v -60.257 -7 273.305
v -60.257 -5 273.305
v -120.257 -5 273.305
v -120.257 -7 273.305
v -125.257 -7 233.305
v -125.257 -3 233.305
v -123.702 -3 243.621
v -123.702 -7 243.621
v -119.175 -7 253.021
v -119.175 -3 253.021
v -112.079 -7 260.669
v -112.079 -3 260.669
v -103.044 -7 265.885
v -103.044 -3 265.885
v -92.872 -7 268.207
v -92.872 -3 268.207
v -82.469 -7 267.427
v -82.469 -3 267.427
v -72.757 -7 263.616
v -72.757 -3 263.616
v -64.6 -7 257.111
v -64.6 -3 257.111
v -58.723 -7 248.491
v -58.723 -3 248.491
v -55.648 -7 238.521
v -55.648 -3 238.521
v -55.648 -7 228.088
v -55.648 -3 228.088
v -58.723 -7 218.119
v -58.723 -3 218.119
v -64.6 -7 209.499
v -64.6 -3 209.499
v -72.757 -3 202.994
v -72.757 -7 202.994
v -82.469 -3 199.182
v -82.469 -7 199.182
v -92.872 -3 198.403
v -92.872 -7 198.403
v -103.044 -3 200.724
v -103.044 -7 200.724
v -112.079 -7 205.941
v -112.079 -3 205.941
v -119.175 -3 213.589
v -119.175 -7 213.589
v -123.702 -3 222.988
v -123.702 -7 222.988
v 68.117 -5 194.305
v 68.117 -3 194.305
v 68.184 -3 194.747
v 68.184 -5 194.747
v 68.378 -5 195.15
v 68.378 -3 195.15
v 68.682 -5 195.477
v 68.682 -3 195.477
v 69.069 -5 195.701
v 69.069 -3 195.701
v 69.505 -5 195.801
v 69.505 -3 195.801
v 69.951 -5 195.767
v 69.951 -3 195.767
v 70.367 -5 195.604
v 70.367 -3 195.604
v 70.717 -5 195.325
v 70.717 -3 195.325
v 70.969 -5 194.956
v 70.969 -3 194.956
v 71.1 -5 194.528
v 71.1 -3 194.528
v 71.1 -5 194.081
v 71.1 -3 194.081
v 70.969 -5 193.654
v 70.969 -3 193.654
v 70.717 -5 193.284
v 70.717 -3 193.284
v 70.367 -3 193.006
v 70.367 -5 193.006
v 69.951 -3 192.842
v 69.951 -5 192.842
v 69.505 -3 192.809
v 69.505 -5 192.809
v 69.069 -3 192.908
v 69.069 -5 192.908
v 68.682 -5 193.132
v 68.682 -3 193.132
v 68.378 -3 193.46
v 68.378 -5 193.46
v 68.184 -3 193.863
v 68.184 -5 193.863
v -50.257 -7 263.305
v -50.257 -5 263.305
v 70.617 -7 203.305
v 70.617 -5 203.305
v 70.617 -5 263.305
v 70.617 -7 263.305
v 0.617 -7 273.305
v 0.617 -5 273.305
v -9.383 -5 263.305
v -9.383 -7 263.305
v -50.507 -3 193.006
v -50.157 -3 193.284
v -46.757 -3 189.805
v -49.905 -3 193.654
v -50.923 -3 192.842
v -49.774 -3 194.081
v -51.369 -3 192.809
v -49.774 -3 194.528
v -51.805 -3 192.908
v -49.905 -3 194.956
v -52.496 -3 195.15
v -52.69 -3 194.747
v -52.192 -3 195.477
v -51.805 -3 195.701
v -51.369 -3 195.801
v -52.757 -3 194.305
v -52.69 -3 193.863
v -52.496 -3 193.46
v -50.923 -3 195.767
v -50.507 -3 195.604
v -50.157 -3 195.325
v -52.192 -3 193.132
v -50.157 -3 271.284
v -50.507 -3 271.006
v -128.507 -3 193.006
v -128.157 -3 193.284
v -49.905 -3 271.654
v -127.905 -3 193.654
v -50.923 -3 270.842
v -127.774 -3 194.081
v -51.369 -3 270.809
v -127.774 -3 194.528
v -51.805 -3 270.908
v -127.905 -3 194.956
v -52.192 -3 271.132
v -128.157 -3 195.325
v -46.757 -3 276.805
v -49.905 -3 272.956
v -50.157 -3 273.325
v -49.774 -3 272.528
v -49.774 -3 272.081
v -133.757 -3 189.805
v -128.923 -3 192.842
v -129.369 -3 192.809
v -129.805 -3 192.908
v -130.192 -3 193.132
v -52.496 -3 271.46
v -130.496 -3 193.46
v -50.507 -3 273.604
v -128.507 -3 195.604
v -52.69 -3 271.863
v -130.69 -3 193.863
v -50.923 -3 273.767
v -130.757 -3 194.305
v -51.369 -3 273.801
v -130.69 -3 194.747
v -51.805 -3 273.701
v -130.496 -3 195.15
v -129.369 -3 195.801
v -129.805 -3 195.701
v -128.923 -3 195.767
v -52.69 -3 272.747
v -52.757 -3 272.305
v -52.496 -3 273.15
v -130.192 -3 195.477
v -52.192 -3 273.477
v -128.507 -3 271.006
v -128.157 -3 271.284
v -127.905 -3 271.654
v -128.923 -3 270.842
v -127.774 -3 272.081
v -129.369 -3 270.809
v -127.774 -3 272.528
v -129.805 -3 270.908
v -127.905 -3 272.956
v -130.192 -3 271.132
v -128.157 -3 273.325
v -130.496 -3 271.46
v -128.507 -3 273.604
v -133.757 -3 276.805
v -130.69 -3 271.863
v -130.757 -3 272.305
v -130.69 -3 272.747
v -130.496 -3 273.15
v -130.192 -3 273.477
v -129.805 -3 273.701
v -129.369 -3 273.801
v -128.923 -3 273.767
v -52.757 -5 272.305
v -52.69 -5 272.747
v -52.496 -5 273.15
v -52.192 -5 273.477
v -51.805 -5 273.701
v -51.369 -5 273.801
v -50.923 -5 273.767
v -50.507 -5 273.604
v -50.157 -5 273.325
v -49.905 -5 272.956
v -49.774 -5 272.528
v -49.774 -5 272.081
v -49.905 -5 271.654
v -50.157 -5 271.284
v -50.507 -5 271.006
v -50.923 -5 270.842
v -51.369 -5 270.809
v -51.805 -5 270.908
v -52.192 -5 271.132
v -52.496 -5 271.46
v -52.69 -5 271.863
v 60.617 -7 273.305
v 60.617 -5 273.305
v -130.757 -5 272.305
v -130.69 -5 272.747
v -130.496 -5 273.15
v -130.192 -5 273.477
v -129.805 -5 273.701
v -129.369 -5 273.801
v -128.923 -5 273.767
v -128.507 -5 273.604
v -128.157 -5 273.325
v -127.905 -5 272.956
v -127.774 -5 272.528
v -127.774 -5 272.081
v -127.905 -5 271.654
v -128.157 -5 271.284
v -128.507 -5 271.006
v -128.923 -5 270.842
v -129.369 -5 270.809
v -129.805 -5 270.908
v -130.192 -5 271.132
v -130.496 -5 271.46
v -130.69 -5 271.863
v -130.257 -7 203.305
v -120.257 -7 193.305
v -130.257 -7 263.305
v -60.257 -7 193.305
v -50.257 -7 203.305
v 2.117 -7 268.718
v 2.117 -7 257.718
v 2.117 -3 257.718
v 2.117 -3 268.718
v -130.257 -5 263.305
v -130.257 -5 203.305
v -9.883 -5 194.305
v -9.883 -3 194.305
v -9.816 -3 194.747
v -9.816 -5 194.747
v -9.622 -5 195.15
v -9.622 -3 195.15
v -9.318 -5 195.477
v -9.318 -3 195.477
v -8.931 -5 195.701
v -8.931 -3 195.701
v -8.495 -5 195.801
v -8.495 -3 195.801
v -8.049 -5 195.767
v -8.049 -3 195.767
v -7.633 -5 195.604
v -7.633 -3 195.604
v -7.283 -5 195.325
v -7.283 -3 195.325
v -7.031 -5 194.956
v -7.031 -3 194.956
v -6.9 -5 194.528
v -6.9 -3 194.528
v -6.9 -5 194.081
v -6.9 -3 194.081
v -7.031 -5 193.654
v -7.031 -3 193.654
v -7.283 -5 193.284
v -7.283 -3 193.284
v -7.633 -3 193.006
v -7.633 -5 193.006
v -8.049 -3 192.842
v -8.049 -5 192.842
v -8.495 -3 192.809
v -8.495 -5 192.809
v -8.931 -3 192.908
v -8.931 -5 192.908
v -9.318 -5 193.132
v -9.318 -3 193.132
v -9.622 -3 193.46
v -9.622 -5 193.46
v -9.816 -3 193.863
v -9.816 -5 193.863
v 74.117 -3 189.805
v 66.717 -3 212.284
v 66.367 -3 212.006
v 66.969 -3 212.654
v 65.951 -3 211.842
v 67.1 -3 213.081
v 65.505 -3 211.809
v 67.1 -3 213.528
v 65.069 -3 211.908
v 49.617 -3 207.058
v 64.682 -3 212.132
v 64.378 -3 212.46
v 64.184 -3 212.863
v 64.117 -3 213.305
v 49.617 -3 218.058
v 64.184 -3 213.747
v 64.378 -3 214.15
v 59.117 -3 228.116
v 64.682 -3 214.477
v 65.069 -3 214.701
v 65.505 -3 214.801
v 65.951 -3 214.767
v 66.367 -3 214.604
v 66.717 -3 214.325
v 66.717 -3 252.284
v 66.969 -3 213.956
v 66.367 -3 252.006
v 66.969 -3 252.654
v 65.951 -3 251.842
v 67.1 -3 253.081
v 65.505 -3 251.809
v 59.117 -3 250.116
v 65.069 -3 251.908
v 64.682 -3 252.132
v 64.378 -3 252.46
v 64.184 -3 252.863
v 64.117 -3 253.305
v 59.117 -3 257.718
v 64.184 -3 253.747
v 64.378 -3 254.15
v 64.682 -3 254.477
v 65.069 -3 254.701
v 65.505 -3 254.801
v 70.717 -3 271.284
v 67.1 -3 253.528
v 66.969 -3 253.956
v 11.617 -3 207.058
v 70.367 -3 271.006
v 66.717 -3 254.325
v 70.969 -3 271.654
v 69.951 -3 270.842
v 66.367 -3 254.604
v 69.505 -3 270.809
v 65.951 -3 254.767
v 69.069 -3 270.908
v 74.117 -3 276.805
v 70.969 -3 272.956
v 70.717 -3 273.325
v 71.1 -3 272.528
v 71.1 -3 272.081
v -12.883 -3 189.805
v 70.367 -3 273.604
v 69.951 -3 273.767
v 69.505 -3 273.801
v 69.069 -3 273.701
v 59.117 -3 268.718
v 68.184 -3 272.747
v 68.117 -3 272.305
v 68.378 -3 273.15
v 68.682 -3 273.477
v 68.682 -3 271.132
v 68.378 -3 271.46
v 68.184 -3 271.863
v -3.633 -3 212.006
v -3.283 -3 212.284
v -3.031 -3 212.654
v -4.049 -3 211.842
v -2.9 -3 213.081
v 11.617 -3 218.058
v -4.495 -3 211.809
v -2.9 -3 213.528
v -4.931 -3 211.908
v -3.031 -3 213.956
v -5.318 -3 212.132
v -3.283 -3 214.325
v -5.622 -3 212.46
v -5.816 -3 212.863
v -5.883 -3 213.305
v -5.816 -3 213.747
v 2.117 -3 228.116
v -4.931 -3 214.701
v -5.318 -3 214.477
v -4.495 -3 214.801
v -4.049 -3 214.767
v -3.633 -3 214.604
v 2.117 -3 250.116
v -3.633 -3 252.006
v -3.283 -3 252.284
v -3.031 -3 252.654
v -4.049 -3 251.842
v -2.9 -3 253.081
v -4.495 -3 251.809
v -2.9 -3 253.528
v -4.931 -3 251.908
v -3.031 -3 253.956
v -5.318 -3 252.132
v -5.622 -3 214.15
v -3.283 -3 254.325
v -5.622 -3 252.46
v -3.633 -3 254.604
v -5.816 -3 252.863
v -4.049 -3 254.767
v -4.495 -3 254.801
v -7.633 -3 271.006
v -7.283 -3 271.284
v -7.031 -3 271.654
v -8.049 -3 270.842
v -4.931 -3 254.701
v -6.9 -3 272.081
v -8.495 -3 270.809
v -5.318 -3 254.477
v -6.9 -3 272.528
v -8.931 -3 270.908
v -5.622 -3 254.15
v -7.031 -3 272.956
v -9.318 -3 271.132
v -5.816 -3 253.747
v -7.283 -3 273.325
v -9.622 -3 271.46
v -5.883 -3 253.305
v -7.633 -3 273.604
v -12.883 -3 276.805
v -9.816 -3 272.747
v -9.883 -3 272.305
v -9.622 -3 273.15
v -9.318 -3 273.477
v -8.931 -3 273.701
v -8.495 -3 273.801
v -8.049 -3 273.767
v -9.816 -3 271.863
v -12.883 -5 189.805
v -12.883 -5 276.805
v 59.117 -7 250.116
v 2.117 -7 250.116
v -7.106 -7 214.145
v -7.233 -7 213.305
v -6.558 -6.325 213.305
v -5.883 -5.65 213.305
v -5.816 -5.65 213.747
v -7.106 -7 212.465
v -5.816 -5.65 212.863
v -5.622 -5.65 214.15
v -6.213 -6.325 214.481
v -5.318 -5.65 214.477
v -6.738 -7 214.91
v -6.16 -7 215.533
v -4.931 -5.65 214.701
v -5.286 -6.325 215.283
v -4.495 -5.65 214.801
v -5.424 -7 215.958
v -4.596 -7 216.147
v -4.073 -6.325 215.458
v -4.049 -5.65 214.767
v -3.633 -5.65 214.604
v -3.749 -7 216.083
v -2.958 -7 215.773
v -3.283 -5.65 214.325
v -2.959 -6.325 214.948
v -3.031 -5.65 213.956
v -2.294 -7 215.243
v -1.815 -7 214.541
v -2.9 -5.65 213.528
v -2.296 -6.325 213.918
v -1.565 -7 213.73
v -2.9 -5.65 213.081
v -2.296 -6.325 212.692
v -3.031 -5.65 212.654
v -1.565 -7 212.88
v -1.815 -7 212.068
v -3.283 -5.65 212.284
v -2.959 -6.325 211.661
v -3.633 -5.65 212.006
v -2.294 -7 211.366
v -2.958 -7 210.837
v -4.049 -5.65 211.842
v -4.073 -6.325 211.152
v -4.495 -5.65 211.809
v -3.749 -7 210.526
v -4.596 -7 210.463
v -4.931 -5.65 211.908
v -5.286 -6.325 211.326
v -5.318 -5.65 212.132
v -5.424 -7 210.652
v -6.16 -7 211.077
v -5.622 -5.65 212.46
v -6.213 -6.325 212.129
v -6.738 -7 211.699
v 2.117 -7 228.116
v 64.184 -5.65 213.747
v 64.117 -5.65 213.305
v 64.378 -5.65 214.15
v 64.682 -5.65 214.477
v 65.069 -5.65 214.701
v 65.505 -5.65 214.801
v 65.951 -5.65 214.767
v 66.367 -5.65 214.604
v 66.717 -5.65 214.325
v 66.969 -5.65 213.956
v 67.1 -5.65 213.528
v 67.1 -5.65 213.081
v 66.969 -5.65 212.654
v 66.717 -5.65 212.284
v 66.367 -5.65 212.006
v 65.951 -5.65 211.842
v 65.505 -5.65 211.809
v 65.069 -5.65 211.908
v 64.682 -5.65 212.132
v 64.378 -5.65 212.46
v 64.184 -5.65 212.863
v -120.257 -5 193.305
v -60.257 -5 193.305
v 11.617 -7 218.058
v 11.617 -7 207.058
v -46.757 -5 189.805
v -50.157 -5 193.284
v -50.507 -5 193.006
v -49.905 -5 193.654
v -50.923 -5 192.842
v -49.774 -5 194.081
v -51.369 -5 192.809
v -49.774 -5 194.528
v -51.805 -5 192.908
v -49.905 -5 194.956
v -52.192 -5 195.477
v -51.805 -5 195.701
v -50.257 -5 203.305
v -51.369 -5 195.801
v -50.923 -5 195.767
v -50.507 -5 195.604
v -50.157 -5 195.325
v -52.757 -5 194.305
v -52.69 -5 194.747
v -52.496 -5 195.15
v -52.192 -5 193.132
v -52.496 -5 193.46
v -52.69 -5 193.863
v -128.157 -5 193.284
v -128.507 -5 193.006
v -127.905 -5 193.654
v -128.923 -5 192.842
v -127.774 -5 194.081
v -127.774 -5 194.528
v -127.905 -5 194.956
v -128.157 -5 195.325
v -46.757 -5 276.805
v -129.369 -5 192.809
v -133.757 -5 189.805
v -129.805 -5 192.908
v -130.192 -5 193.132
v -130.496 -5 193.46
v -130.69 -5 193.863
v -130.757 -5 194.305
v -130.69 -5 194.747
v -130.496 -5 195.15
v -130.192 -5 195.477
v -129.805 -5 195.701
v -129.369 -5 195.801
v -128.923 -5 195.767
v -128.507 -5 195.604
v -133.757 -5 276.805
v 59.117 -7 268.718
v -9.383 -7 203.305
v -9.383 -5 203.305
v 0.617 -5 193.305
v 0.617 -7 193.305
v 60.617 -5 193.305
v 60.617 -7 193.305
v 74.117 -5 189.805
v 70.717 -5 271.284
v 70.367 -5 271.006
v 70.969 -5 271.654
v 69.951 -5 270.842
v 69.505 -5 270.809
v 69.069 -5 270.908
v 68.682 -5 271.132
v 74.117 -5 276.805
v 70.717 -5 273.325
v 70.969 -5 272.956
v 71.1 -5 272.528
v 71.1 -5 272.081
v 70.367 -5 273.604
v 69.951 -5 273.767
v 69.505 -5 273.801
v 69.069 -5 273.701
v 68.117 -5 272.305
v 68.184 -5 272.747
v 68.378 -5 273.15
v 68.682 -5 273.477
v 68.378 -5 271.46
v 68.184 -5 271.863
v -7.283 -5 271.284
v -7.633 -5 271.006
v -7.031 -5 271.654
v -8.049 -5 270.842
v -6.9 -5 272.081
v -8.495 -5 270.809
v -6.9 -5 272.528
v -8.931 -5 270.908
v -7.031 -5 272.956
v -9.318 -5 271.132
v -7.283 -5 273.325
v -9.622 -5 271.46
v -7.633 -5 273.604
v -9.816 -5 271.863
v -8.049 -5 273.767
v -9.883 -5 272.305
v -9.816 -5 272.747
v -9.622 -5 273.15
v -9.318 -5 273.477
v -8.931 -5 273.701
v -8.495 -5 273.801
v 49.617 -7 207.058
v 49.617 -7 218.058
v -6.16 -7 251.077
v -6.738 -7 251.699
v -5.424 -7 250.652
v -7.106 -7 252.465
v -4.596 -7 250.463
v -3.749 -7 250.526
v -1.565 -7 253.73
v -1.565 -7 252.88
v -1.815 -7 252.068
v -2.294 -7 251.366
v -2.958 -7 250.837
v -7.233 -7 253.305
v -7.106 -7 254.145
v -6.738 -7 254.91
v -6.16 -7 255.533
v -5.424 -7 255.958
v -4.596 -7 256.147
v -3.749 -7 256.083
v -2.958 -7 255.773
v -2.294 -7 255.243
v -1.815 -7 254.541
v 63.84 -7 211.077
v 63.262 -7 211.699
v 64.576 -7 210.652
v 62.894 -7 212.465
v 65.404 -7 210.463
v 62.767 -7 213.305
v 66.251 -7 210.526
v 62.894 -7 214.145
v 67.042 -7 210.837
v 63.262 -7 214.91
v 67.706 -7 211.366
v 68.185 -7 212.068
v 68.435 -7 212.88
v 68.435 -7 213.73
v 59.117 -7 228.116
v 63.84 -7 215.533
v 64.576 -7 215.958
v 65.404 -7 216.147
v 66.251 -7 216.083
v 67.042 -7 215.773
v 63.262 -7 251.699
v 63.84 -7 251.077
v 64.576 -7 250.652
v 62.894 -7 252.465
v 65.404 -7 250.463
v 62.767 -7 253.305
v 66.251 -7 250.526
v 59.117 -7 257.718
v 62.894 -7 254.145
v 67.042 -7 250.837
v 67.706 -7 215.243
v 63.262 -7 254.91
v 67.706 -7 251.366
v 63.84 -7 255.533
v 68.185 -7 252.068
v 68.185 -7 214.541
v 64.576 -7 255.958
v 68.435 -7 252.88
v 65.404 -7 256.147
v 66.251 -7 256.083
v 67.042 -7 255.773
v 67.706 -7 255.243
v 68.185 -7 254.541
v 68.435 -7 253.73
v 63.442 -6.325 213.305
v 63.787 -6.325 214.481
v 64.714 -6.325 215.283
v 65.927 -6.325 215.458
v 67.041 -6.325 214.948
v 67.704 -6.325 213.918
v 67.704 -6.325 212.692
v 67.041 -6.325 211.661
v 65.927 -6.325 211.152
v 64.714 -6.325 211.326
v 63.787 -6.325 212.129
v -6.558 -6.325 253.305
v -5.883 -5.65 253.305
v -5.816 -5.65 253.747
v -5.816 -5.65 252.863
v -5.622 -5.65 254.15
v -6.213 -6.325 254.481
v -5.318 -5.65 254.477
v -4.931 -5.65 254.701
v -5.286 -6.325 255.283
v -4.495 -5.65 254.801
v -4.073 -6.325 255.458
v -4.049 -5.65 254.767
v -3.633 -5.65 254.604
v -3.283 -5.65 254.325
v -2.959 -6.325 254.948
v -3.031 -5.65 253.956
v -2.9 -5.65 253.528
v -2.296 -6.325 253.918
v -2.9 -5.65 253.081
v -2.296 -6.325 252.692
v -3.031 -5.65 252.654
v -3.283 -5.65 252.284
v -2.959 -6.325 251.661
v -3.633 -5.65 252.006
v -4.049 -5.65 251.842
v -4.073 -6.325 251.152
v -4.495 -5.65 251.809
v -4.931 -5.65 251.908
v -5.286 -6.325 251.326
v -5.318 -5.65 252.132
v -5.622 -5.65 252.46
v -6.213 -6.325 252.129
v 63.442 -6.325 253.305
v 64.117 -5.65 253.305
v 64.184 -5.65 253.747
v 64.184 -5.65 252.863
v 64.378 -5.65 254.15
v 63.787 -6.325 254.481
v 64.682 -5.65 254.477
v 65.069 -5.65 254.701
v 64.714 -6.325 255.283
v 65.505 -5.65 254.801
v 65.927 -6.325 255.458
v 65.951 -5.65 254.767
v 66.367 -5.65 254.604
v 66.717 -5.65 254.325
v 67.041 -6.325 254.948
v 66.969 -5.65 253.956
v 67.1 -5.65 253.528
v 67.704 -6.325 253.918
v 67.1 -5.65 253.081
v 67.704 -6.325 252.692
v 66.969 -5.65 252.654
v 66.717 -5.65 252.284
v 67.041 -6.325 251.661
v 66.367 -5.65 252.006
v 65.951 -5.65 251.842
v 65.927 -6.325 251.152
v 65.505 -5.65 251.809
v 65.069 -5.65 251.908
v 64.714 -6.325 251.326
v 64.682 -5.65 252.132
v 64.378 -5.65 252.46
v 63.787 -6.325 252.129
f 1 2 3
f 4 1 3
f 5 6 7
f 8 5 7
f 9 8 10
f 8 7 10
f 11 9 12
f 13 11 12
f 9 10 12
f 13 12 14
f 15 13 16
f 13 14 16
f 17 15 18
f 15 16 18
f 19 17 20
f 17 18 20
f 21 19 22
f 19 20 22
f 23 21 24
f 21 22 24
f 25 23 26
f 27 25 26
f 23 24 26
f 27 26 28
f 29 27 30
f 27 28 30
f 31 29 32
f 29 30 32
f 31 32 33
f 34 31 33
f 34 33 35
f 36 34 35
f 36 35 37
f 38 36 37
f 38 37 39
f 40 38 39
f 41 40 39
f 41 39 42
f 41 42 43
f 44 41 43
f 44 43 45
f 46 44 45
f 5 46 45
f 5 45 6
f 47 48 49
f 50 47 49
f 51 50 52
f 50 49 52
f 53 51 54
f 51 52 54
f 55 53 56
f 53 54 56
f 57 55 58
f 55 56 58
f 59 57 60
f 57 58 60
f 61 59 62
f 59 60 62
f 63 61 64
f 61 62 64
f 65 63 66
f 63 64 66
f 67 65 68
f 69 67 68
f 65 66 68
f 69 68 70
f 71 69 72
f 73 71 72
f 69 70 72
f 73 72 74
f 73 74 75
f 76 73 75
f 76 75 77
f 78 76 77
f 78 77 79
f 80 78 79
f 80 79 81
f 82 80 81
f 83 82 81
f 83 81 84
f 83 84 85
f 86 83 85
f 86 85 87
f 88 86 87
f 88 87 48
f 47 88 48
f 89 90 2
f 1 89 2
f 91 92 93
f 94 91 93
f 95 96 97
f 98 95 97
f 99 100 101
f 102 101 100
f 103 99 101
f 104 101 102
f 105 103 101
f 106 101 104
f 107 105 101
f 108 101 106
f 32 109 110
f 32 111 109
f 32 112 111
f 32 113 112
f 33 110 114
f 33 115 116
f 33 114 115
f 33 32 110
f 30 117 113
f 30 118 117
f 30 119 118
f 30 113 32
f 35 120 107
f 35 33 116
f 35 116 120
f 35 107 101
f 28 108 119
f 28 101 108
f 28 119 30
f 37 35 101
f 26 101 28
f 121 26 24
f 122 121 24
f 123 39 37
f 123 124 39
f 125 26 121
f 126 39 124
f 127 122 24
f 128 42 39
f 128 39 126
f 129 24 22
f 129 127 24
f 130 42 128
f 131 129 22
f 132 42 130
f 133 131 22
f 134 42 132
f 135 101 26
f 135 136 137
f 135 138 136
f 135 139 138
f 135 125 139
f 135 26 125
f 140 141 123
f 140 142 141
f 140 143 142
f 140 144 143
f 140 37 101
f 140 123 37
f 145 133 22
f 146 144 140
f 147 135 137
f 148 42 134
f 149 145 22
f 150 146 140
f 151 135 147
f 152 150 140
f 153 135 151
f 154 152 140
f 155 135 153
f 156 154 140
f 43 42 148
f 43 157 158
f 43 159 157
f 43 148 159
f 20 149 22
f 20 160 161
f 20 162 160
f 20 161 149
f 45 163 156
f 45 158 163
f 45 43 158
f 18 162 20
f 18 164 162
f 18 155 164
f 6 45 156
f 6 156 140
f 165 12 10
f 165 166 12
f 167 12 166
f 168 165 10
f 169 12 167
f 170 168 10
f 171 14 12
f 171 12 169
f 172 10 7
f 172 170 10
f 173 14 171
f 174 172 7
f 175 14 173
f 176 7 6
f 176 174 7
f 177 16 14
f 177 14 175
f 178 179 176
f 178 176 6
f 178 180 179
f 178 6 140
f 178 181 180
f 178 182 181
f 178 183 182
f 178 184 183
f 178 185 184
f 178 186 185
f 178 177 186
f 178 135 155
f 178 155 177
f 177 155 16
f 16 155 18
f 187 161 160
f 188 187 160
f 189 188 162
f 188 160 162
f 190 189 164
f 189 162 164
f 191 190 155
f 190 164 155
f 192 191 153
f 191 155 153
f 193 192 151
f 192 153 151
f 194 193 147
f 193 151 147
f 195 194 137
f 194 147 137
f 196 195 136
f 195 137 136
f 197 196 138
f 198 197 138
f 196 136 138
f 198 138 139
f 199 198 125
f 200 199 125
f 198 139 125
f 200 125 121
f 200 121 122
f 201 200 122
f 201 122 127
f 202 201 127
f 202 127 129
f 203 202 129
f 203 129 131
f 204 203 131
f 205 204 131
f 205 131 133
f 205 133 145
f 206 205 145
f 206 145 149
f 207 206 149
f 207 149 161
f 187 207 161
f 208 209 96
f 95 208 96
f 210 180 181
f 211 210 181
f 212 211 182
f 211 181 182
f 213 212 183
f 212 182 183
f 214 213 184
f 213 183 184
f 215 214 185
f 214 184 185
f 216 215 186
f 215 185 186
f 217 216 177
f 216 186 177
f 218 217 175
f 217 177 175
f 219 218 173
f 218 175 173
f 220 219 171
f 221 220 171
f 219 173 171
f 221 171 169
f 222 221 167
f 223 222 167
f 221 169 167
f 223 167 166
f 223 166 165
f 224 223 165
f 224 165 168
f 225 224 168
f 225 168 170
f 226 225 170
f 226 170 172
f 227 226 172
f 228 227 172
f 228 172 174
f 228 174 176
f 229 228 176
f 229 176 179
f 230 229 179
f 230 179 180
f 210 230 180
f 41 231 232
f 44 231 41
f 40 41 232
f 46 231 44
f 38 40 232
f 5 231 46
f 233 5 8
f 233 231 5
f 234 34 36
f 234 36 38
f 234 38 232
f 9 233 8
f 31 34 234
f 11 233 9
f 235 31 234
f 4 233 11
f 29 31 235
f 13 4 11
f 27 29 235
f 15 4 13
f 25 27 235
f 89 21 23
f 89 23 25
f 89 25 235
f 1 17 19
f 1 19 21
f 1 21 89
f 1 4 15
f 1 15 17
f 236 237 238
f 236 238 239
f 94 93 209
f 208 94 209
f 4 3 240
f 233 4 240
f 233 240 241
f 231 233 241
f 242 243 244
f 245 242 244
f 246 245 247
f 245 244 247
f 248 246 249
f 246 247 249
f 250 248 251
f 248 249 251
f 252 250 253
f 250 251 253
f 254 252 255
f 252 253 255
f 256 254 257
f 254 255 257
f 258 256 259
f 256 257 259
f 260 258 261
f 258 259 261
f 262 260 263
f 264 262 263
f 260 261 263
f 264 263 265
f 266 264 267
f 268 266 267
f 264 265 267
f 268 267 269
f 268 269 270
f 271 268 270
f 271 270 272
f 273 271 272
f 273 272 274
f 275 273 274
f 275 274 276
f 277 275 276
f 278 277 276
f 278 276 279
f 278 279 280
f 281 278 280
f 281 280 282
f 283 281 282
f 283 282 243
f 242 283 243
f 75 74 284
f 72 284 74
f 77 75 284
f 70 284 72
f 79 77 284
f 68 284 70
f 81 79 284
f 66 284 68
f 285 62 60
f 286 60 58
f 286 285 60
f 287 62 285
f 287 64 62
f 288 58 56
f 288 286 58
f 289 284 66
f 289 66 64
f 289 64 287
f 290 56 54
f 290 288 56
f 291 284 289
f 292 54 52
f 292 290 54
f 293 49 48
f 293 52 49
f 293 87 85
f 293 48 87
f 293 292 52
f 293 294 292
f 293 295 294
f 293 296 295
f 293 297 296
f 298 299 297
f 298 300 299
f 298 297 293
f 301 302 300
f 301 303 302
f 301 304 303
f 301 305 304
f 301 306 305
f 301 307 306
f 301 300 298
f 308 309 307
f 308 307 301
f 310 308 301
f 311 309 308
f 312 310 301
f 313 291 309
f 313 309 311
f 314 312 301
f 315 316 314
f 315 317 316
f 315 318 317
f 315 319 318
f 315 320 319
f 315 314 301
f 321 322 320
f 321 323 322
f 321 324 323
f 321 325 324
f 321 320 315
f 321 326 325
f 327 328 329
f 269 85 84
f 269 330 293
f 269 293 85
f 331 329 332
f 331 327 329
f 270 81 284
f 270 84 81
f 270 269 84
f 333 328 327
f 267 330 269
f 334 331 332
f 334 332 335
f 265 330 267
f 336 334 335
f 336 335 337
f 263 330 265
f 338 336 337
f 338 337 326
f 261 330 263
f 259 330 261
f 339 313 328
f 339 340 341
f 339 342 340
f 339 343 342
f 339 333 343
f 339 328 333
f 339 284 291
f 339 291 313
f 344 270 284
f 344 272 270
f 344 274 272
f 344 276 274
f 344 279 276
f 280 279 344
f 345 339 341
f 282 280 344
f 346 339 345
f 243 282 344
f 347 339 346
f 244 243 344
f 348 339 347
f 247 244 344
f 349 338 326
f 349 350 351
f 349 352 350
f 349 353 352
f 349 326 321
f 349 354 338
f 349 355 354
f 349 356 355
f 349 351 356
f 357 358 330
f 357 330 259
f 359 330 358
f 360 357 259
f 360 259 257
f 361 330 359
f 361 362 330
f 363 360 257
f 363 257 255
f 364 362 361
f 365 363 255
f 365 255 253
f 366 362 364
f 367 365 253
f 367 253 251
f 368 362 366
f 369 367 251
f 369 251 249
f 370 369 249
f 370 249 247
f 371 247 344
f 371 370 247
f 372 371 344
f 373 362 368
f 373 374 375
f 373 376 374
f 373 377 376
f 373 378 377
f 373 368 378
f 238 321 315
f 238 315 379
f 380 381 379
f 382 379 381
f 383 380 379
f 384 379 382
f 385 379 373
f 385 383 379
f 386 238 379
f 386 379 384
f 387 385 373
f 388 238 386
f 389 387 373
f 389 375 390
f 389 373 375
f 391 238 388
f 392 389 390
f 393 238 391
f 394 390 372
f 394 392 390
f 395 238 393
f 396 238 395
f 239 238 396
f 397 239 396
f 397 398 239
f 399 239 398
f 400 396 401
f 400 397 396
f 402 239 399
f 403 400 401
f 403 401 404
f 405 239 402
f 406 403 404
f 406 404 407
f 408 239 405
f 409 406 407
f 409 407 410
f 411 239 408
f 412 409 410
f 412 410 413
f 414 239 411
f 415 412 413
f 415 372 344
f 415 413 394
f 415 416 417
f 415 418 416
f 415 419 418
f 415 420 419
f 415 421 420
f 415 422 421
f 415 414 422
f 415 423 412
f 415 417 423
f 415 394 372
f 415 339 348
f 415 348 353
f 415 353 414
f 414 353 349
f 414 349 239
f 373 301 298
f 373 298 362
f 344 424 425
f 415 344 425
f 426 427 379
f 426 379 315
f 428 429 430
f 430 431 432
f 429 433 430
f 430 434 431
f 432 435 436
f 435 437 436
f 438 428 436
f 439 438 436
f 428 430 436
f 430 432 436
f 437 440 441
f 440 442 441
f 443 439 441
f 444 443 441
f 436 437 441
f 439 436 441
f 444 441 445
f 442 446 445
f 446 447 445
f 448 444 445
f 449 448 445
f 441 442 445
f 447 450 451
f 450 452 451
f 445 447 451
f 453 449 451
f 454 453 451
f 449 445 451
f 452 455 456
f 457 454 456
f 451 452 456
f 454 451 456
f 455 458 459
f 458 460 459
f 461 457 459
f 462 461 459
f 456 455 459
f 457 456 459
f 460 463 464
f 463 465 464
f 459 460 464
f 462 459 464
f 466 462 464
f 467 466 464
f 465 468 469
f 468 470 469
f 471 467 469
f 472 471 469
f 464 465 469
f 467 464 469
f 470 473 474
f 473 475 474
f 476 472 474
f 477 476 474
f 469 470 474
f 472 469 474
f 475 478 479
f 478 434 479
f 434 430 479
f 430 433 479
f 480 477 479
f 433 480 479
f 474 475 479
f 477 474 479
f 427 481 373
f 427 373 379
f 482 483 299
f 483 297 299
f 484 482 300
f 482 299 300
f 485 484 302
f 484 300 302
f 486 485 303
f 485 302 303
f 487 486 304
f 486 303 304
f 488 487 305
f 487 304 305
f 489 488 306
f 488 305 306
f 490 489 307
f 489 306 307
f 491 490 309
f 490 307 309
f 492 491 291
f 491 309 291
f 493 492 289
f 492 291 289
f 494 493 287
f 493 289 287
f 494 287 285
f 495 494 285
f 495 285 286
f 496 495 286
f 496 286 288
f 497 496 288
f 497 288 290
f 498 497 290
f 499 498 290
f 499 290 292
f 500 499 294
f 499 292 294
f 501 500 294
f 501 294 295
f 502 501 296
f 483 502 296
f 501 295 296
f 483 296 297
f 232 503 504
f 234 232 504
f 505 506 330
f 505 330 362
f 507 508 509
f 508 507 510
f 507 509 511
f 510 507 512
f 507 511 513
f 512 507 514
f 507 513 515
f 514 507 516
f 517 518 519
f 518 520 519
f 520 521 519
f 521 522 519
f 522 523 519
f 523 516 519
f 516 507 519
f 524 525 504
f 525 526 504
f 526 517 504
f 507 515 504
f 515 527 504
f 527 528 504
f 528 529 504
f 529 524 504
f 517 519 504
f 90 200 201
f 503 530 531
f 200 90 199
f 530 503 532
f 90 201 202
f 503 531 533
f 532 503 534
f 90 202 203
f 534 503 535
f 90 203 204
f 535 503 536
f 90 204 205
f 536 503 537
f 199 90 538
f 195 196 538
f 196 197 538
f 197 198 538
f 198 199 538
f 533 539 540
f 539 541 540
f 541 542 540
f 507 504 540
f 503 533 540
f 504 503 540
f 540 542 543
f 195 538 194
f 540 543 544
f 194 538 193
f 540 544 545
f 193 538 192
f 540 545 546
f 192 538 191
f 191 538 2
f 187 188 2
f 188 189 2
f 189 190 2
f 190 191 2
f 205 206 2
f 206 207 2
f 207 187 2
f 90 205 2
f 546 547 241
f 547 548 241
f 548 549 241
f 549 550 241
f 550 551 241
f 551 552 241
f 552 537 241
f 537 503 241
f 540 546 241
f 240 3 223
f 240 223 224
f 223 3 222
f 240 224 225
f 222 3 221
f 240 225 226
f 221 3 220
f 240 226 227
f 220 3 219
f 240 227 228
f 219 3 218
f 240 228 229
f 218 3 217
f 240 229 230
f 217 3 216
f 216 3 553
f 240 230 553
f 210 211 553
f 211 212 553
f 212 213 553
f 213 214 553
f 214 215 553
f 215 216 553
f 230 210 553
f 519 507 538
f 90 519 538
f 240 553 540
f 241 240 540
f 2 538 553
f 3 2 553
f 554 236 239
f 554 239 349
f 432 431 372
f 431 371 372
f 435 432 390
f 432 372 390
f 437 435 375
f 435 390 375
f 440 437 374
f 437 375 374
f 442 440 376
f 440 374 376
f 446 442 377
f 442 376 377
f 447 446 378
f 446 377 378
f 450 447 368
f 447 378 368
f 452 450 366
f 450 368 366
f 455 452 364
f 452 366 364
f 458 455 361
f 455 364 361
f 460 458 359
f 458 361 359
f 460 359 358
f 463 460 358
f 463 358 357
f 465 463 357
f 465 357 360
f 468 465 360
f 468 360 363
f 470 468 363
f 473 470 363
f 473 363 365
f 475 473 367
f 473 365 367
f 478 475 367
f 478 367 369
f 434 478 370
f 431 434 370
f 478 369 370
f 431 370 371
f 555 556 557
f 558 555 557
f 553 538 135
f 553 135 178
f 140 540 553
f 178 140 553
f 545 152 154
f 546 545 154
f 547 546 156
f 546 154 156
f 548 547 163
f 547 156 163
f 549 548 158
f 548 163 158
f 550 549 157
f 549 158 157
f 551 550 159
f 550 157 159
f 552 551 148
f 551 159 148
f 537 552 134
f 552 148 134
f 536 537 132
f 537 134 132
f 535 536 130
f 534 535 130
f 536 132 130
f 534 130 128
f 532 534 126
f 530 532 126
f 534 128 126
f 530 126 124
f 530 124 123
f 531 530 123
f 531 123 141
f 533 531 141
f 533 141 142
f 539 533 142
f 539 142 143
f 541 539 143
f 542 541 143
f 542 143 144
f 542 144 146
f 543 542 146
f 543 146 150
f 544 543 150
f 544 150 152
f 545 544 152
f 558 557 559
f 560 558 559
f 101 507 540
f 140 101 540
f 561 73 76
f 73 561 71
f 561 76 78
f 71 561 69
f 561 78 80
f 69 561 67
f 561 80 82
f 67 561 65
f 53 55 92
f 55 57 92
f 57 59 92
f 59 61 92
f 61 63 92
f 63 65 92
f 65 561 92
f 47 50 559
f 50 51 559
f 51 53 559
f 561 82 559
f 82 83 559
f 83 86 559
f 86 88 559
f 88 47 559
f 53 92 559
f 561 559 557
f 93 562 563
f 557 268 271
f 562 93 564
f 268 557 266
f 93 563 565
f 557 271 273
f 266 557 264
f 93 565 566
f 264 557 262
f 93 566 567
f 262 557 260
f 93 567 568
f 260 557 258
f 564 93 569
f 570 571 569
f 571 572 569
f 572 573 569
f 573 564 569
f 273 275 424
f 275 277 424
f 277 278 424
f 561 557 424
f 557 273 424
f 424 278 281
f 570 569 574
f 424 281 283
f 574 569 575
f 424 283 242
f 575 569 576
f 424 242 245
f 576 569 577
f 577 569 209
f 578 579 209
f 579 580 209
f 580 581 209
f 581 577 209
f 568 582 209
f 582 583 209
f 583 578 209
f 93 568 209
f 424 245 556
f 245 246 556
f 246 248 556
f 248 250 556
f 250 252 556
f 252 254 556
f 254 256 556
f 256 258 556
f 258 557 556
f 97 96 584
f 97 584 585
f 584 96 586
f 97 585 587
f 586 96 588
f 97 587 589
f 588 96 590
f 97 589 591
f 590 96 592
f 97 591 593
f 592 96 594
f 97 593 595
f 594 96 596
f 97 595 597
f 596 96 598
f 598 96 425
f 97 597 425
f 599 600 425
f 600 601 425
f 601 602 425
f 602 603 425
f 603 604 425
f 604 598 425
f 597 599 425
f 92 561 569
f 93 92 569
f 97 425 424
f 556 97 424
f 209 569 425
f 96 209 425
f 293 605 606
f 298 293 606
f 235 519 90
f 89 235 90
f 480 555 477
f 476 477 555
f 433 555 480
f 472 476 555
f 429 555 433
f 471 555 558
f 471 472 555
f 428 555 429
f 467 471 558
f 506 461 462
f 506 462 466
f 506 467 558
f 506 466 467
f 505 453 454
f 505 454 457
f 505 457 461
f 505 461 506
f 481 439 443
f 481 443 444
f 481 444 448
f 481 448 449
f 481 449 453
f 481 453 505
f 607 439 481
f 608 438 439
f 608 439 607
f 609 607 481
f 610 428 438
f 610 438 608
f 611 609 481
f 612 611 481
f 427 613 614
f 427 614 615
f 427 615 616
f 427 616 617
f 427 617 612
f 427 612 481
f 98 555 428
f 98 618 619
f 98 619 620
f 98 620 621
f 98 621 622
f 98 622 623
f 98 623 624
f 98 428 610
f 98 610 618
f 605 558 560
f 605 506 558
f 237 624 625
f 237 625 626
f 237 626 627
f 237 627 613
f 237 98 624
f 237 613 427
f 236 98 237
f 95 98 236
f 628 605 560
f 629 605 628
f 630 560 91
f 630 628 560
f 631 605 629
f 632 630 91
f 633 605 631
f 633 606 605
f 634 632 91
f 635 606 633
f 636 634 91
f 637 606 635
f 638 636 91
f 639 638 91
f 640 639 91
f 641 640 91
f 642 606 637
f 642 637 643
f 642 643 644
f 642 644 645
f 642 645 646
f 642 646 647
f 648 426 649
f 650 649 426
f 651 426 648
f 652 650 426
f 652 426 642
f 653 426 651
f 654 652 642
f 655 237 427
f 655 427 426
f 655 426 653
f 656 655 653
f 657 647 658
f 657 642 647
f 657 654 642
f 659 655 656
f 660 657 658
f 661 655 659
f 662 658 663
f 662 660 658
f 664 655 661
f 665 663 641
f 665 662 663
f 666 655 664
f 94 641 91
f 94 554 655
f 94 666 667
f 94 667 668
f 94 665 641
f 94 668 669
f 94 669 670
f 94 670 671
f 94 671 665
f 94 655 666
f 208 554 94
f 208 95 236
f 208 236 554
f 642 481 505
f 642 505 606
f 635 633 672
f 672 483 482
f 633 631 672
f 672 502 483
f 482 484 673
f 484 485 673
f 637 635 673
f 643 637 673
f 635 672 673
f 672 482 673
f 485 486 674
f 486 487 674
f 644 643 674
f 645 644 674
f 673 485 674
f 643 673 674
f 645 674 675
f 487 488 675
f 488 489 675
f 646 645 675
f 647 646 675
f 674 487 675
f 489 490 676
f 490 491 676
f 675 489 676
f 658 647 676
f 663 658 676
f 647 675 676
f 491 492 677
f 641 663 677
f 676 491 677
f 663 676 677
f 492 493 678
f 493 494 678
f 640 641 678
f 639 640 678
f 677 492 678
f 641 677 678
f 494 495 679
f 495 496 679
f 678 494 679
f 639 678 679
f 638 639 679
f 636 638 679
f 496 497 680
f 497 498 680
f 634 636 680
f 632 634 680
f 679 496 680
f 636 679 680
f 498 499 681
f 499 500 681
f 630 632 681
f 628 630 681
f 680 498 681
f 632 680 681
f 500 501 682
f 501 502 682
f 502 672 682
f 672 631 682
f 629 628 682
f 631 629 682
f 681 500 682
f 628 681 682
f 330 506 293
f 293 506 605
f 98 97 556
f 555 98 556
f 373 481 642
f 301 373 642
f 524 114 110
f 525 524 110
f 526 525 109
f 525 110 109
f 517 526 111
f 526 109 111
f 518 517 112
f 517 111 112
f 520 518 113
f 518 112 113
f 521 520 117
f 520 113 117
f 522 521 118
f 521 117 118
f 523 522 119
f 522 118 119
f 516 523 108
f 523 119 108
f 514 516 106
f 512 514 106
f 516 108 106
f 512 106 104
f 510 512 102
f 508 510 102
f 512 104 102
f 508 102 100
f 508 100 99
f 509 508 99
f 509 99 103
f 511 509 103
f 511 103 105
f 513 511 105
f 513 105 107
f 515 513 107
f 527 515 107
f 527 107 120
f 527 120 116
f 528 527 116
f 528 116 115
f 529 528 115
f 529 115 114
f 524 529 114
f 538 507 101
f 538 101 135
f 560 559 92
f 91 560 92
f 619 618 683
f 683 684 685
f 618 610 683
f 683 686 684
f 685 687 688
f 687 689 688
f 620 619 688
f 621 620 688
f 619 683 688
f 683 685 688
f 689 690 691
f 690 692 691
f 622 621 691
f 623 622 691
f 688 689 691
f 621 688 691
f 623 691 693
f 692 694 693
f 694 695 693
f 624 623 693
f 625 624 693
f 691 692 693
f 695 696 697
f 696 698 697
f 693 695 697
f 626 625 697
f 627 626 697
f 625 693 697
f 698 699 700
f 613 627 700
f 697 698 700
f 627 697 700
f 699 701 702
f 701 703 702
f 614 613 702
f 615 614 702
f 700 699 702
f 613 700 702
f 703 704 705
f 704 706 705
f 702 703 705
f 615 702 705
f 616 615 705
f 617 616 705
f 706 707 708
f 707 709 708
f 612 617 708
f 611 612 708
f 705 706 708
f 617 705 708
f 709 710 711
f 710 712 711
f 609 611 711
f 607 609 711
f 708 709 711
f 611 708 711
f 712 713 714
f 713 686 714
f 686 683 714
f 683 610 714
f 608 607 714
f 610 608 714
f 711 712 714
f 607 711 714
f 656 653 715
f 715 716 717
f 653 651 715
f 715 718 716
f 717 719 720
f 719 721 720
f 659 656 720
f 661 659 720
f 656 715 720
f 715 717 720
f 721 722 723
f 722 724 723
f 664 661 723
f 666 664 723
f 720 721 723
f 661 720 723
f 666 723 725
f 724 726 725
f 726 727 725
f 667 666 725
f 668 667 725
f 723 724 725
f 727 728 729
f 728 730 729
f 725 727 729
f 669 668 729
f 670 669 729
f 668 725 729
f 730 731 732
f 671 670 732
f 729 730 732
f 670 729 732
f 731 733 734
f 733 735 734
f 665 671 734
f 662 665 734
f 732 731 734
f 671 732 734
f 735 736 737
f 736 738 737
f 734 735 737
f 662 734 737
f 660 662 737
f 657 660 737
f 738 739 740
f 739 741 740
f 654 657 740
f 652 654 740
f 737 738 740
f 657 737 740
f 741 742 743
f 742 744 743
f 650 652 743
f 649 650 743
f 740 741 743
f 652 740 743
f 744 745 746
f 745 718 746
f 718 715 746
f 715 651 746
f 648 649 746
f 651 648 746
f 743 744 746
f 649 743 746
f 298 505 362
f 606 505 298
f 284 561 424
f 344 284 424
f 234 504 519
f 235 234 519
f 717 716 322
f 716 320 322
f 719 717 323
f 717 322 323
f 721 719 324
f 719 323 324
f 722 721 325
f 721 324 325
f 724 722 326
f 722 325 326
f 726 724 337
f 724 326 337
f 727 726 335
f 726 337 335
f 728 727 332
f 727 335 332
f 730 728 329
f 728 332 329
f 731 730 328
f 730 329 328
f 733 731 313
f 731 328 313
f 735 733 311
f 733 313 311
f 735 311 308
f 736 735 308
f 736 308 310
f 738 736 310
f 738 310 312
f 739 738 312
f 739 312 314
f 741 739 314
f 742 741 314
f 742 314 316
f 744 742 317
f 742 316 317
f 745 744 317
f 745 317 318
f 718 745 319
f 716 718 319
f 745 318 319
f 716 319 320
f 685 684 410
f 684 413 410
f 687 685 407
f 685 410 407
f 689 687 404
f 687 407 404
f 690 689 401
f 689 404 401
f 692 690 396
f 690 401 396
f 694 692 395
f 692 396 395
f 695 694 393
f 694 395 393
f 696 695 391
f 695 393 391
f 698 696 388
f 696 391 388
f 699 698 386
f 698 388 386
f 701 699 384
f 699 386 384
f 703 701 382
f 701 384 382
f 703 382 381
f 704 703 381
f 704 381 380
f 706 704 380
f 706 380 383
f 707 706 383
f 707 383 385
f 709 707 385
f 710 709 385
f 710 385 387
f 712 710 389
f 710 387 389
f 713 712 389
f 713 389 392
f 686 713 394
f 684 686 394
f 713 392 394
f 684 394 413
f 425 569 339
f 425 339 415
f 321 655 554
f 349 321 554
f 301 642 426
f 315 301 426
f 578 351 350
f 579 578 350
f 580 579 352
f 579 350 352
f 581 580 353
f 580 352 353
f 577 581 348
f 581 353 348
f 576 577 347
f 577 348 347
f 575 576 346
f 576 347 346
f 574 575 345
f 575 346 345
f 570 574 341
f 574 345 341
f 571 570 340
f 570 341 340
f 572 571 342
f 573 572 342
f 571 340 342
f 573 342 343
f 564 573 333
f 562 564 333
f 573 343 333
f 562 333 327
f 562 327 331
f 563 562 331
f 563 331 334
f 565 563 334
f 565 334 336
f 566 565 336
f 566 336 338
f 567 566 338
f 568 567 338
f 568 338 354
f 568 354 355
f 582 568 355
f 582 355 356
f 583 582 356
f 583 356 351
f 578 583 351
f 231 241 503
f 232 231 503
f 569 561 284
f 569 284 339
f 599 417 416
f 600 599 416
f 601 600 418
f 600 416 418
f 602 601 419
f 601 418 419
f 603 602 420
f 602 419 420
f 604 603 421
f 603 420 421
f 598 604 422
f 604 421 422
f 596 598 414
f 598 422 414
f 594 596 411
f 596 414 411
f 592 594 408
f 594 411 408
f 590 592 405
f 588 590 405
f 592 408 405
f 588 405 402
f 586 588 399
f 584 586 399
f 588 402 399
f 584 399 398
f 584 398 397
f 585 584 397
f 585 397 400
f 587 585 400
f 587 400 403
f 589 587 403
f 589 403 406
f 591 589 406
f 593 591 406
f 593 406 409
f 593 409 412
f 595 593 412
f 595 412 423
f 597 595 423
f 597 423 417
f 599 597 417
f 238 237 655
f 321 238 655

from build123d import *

# Parameters (mm, degrees)
F2_DEPTH        = 2
F3_W            = 87
F3_H            = 87
F4_DEPTH        = 2
F6_D            = 3
F7_D            = 70
F9_DEPTH        = 2
F10_W           = 87
F10_H           = 87
F11_DEPTH       = 2
F13_D           = 3
F14_D           = 3
F14_CSINK_D     = 5.7
F14_CSINK_ANGLE = 90
F15_W           = 57
F15_H           = 11
F15_H_2         = 22
F15_W_2         = 38
F16_DEPTH       = 5


with BuildPart() as f2:
    # F1 (on offset) → F2 (new body)
    with BuildSketch(Plane.XZ.offset(5)):
        Polygon((-50.25688, 233.304736), (-50.25688, 263.304736), (-60.25688, 273.304736), (-90.25688, 273.304736), (-120.25688, 273.304736), (-130.25688, 263.304736), (-130.25688, 233.304736), (-130.25688, 203.304736), (-120.25688, 193.304736), (-90.25688, 193.304736), (-60.25688, 193.304736), (-50.25688, 203.304736), align=None)
    extrude(amount=F2_DEPTH)

    # F3 (on face) → F4 (join)
    with BuildSketch(Plane(origin=(0, -5, 0), x_dir=(-1, 0, 0), z_dir=(0, 1, 0))):
        with Locations((90.25688, 233.304736)):
            Rectangle(F3_W, F3_H)
    extrude(amount=F4_DEPTH)

    # F6 (through all)
    with Locations(Plane.XZ.offset(7)):
        with Locations((-129.25688, 272.304736), (-51.25688, 272.304736), (-51.25688, 194.304736), (-129.25688, 194.304736)):
            Hole(F6_D / 2)

    # F7 (through all)
    with Locations(Plane.XZ.offset(7)):
        with Locations((-90.25688, 233.304736)):
            Hole(F7_D / 2)


with BuildPart() as f9:
    # F8 (on offset) → F9 (new body)
    with BuildSketch(Plane.XZ.offset(5)):
        Polygon((70.617062, 233.304736), (70.617062, 263.304736), (60.617062, 273.304736), (30.617062, 273.304736), (0.617062, 273.304736), (-9.382938, 263.304736), (-9.382938, 233.304736), (-9.382938, 203.304736), (0.617062, 193.304736), (30.617062, 193.304736), (60.617062, 193.304736), (70.617062, 203.304736), align=None)
    extrude(amount=F9_DEPTH)

    # F10 (on face) → F11 (join)
    with BuildSketch(Plane(origin=(0, -5, 0), x_dir=(-1, 0, 0), z_dir=(0, 1, 0))):
        with Locations((-30.617062, 233.304736)):
            Rectangle(F10_W, F10_H)
    extrude(amount=F11_DEPTH)

    # F13 (through all)
    with Locations(Plane.XZ.offset(7)):
        with Locations((-8.382938, 272.304736), (-8.382938, 194.304736), (69.617062, 194.304736), (69.617062, 272.304736)):
            Hole(F13_D / 2)

    # F14 (through all)
    with Locations(Plane.XZ.offset(7)):
        with Locations((-4.382938, 253.304736), (-4.382938, 213.304736), (65.617062, 213.304736), (65.617062, 253.304736)):
            CounterSinkHole(F14_D / 2, F14_CSINK_D / 2, counter_sink_angle=F14_CSINK_ANGLE)

    # F15 (on face) → F16 (cut)
    with BuildSketch(Plane.XZ.offset(7)):
        with Locations((30.617062, 263.218444)):
            Rectangle(F15_W, F15_H)
        with Locations((30.617062, 239.115536)):
            Rectangle(F15_W, F15_H_2)
        with Locations((30.617062, 212.557742)):
            Rectangle(F15_W_2, F15_H)
    extrude(amount=-F16_DEPTH, mode=Mode.SUBTRACT)


solid = Compound([f2.part, f9.part])
